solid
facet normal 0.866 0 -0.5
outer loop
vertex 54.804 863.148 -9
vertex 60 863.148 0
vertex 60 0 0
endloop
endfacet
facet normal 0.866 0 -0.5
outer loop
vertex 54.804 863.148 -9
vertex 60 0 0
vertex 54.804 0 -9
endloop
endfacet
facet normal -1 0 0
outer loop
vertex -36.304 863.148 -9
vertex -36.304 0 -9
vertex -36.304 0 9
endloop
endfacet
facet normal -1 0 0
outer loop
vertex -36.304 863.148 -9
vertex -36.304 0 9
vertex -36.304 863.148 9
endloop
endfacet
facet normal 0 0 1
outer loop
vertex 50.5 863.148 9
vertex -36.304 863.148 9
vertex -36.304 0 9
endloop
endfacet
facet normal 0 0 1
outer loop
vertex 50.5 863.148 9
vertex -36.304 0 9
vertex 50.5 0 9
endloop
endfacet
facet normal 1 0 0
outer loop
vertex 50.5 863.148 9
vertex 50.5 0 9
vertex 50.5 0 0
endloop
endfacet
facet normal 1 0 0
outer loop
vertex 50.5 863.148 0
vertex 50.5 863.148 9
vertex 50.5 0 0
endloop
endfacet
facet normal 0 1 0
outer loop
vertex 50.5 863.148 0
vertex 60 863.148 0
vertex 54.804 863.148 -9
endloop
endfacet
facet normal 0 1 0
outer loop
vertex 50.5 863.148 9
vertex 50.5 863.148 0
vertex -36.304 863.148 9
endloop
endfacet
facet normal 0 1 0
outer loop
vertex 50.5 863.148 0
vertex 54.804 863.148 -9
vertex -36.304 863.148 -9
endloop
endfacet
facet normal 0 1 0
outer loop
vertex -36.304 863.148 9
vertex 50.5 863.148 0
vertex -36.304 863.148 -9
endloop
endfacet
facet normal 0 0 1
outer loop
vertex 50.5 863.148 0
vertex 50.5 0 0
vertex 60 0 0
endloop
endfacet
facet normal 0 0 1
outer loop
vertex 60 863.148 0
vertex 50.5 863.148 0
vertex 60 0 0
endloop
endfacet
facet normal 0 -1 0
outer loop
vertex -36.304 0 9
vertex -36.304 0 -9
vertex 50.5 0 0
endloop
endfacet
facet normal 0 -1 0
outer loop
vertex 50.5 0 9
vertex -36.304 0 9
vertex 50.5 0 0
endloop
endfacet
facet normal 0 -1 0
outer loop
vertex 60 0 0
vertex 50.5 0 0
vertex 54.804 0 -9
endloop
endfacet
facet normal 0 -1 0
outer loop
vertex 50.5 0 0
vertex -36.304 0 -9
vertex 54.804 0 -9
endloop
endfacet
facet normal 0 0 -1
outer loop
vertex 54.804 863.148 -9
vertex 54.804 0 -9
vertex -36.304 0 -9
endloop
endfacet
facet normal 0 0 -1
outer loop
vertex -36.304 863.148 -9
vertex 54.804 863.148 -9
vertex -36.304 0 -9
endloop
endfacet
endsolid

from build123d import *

# Parameters (mm, degrees)
SHAPE_DEPTH        = 1000
CUT_EXTRUDE8_REACH = 20
SKETCH10_W         = 5.196152423
SKETCH10_H         = 136.851692929
SKETCH10_W_2       = 91.107695154
SKETCH10_W_3       = 23.696152423
SKETCH10_H_2       = 863.148307071


with BuildPart() as part:
    # Sketch1 → Shape (new body)
    with BuildSketch(Plane(origin=(0, 0, 0), x_dir=(1, 0, 0), z_dir=(0, 1, 0))):
        Polygon((-41.5, 0), (-60, 0), (-60, -9), (50.5, -9), (50.5, 0), (60, 0), (54.803847577, 9), (-36.303847577, 9), align=None)
    extrude(amount=SHAPE_DEPTH)

    # Sketch10 → Cut-Extrude8 (cut, up to next)
    with BuildSketch(Plane(origin=(0, 0, -9), x_dir=(-1, 0, 0), z_dir=(0, 0, -1)), mode=Mode.PRIVATE) as cut_extrude8_sk1:
        with Locations((-57.401923789, 931.574153536)):
            Rectangle(SKETCH10_W, SKETCH10_H)
    cut_extrude8_tool1 = extrude(cut_extrude8_sk1.sketch, amount=-CUT_EXTRUDE8_REACH, mode=Mode.PRIVATE) & part.part
    add(cut_extrude8_tool1.solids().sort_by_distance((57.401924, 931.574154, -9))[0], mode=Mode.SUBTRACT)
    # Sketch10 → Cut-Extrude8 (cut, up to next)
    with BuildSketch(Plane(origin=(0, 0, -9), x_dir=(-1, 0, 0), z_dir=(0, 0, -1)), mode=Mode.PRIVATE) as cut_extrude8_sk2:
        with Locations((-9.25, 931.574153536)):
            Rectangle(SKETCH10_W_2, SKETCH10_H)
    cut_extrude8_tool2 = extrude(cut_extrude8_sk2.sketch, amount=-CUT_EXTRUDE8_REACH, mode=Mode.PRIVATE) & part.part
    add(cut_extrude8_tool2.solids().sort_by_distance((9.25, 931.574154, -9))[0], mode=Mode.SUBTRACT)
    # Sketch10 → Cut-Extrude8 (cut, up to next)
    with BuildSketch(Plane(origin=(0, 0, -9), x_dir=(-1, 0, 0), z_dir=(0, 0, -1)), mode=Mode.PRIVATE) as cut_extrude8_sk3:
        with Locations((48.151923788, 931.574153536)):
            Rectangle(SKETCH10_W_3, SKETCH10_H)
    cut_extrude8_tool3 = extrude(cut_extrude8_sk3.sketch, amount=-CUT_EXTRUDE8_REACH, mode=Mode.PRIVATE) & part.part
    add(cut_extrude8_tool3.solids().sort_by_distance((-48.151924, 931.574154, -9))[0], mode=Mode.SUBTRACT)
    # Sketch10 → Cut-Extrude8 (cut, up to next)
    with BuildSketch(Plane(origin=(0, 0, -9), x_dir=(-1, 0, 0), z_dir=(0, 0, -1)), mode=Mode.PRIVATE) as cut_extrude8_sk4:
        with Locations((48.151923788, 431.574153536)):
            Rectangle(SKETCH10_W_3, SKETCH10_H_2)
    cut_extrude8_tool4 = extrude(cut_extrude8_sk4.sketch, amount=-CUT_EXTRUDE8_REACH, mode=Mode.PRIVATE) & part.part
    add(cut_extrude8_tool4.solids().sort_by_distance((-48.151924, 431.574154, -9))[0], mode=Mode.SUBTRACT)


solid = part.part
